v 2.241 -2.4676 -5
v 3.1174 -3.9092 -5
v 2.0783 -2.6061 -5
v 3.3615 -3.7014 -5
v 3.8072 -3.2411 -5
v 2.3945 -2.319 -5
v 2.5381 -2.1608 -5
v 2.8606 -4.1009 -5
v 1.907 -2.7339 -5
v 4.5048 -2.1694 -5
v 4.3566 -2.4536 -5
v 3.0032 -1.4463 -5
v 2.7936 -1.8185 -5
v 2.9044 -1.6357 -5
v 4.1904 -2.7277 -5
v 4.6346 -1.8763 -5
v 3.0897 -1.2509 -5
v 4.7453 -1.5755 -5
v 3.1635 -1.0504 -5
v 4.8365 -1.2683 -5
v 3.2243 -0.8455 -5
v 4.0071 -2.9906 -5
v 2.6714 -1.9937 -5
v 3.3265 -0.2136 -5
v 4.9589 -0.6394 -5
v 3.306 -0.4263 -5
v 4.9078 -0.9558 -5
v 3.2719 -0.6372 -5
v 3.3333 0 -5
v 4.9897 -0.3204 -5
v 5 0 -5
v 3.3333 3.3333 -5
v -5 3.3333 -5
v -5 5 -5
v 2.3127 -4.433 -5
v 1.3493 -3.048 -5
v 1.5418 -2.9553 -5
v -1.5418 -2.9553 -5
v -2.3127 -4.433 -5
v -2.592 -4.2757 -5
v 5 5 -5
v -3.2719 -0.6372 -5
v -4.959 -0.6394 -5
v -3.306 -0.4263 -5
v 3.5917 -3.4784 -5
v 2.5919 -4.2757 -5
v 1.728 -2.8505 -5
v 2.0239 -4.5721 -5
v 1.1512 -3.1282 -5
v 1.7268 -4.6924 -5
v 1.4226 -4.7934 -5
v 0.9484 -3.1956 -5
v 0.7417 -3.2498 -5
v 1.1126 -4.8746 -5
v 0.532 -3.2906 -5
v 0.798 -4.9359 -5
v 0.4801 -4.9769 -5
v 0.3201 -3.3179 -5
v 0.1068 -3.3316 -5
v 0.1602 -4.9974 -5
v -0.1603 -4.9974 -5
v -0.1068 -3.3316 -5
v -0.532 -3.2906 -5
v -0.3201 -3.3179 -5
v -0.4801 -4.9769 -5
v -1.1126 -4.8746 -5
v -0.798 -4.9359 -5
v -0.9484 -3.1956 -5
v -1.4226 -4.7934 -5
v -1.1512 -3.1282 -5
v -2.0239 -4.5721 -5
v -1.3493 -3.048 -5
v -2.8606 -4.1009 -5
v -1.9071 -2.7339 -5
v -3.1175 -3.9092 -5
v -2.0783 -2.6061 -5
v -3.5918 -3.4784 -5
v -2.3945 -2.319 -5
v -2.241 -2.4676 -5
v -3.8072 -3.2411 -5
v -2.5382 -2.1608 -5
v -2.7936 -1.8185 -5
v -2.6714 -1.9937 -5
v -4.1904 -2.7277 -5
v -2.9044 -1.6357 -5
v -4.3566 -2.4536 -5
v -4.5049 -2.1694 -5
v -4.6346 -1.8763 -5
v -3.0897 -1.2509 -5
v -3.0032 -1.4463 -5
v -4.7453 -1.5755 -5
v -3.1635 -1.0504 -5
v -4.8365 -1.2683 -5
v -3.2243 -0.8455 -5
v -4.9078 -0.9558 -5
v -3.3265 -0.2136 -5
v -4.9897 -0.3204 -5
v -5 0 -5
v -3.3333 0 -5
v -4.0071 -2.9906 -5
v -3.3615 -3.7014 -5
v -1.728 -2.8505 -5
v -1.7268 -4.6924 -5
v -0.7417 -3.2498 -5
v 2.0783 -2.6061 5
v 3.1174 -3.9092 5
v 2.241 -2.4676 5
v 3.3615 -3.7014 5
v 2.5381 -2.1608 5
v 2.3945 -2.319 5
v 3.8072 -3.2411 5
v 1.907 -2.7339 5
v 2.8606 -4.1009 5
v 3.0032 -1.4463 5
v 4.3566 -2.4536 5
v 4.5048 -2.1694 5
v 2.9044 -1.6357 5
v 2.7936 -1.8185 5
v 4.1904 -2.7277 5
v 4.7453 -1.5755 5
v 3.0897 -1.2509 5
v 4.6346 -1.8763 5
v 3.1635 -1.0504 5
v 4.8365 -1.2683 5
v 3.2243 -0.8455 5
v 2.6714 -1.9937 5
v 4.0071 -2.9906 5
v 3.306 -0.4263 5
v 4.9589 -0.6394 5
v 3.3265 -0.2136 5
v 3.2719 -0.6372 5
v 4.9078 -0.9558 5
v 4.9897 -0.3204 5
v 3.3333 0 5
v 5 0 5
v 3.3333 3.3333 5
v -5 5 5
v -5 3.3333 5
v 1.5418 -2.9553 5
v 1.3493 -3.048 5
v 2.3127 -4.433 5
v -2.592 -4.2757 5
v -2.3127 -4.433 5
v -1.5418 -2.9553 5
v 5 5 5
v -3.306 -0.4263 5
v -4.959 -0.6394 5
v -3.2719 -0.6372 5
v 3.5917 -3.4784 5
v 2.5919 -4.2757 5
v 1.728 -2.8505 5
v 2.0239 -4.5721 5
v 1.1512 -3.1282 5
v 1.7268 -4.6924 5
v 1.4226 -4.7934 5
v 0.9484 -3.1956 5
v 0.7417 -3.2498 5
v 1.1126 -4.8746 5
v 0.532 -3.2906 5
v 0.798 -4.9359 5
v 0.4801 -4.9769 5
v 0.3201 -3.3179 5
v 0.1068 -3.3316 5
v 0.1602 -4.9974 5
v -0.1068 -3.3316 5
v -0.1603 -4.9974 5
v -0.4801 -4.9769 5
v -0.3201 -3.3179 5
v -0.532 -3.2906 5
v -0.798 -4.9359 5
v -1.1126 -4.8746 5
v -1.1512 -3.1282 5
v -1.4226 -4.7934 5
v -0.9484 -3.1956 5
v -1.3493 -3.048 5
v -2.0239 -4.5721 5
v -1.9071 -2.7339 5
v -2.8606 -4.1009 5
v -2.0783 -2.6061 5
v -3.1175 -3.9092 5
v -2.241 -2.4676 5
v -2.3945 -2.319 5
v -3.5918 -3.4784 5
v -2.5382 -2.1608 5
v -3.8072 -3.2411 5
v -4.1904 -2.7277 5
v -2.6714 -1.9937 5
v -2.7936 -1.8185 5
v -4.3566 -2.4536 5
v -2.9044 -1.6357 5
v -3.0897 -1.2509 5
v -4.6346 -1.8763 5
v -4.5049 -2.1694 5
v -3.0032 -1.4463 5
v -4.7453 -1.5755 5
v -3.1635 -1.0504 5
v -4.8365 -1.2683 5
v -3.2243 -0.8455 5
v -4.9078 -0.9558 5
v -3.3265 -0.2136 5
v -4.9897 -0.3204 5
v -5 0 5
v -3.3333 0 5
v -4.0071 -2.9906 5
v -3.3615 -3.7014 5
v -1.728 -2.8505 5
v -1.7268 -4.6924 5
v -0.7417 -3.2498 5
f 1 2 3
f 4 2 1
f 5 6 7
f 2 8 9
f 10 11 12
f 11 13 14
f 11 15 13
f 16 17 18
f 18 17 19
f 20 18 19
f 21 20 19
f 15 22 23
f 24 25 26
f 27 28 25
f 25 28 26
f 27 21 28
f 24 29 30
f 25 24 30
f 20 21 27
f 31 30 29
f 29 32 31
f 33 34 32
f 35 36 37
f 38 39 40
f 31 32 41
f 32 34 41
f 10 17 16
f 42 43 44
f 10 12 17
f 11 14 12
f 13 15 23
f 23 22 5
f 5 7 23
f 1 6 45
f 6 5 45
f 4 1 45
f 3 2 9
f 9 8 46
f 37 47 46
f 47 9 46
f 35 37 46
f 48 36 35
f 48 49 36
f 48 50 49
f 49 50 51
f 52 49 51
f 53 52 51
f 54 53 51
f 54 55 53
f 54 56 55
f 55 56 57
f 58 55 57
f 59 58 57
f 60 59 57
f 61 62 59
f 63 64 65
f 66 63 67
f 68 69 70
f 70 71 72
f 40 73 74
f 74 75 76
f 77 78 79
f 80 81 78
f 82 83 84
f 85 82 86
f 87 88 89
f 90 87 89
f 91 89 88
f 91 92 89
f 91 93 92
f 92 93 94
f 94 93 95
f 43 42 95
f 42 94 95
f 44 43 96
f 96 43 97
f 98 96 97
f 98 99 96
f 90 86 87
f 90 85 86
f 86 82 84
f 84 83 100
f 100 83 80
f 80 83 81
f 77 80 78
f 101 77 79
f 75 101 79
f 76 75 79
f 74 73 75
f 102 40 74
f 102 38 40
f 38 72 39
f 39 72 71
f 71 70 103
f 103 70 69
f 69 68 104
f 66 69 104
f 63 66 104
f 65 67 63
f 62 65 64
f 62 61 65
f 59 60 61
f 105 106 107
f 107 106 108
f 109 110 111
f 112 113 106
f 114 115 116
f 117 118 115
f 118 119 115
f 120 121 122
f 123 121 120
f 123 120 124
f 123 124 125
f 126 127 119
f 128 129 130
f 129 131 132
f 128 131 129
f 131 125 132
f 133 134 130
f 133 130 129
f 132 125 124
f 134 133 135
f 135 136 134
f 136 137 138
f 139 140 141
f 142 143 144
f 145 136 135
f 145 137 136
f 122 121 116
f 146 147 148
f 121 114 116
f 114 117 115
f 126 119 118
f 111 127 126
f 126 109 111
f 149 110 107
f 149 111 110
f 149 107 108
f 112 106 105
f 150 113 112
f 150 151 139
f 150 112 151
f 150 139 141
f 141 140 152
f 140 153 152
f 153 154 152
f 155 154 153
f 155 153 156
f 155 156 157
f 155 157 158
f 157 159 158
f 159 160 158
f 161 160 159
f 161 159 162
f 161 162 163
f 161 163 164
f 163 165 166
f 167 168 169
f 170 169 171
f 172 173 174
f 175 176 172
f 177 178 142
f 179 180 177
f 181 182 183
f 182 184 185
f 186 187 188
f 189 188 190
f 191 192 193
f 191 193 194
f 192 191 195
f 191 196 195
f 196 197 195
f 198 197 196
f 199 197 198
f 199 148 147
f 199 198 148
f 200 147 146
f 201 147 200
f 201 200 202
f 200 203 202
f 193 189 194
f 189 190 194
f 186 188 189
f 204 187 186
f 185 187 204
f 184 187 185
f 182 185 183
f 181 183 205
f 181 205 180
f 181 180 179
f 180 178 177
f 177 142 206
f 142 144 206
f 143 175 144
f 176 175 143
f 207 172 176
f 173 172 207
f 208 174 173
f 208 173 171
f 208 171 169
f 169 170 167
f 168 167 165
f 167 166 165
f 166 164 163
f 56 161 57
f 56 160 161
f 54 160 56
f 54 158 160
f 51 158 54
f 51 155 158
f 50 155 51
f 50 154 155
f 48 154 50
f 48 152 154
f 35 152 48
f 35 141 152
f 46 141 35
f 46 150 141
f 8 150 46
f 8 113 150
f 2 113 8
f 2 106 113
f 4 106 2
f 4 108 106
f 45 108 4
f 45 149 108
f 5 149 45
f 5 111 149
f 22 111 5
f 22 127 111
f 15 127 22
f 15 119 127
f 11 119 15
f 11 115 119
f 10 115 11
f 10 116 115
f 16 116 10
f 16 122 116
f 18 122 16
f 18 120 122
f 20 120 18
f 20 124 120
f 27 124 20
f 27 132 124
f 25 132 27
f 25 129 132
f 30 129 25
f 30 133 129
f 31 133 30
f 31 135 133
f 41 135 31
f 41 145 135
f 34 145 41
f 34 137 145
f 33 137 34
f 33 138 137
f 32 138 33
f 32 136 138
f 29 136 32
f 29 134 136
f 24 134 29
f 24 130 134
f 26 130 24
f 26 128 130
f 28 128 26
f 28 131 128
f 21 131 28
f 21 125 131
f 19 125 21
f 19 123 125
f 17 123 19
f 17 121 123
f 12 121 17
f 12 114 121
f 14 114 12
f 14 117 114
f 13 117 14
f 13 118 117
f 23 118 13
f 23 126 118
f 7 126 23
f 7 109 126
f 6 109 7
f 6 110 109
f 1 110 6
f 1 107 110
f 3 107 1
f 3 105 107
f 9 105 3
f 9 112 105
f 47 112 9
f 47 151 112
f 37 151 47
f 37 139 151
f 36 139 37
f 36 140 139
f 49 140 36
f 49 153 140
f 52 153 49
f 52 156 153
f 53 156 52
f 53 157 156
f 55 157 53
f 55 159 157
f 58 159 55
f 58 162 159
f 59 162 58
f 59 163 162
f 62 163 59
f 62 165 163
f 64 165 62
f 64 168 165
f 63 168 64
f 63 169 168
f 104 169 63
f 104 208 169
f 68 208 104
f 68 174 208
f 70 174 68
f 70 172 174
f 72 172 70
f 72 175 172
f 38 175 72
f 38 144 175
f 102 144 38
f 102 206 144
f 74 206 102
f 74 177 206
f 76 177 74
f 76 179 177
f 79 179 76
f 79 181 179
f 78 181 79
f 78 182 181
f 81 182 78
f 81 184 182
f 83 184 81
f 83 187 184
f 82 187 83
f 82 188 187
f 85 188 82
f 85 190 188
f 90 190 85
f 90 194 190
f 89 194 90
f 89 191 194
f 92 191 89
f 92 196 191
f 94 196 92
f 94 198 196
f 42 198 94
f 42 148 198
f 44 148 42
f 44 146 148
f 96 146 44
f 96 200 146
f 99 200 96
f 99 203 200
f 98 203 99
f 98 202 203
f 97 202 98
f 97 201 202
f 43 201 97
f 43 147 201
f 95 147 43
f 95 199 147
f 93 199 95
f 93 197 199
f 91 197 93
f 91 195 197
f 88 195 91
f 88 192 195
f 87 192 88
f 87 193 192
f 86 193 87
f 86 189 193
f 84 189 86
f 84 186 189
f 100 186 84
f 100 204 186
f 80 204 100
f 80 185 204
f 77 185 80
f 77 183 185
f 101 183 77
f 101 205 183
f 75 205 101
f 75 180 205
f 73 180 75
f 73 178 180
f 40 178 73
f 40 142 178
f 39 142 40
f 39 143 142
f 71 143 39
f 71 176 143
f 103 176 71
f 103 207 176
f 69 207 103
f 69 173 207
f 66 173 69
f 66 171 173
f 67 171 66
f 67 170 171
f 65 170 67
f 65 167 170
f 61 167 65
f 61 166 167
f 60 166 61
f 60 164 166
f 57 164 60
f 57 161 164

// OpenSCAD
// Generated by SolidPython 1.1.3 on 2025-02-22 16:50:01
$fn=50;


translate(v = [-5.0000000000, -5.0000000000, -5.0000000000]) {
	linear_extrude(height = 10) {
		polygon(points = [[8.3333333333, 5.0000000000], [8.3264846425, 4.7864326001], [8.3059667127, 4.5737427944], [8.2718638566, 4.3628045710], [8.2243162101, 4.1544847203], [8.1635191567, 3.9496392733], [8.0897225245, 3.7491099837], [8.0032295597, 3.5537208696], [7.9043956804, 3.3642748267], [7.7936270163, 3.1815503293], [7.6713787396, 3.0062982317], [7.5381531946, 2.8392386823], [7.3944978337, 2.6810581647], [7.2410029675, 2.5324066764], [7.0782993395, 2.3938950584], [6.9070555337, 2.2660924847], [6.7279752277, 2.1495241233], [6.5417943008, 2.0446689788], [6.3492778104, 1.9519579233], [6.1512168481, 1.8717719265], [5.9484252888, 1.8044404899], [5.7417364465, 1.7502402927], [5.5319996501, 1.7093940553], [5.3200767530, 1.6820696235], [5.1068385919, 1.6683792793], [4.8931614081, 1.6683792793], [4.6799232470, 1.6820696235], [4.4680003499, 1.7093940553], [4.2582635535, 1.7502402927], [4.0515747112, 1.8044404899], [3.8487831519, 1.8717719265], [3.6507221896, 1.9519579233], [3.4582056992, 2.0446689788], [3.2720247723, 2.1495241233], [3.0929444663, 2.2660924847], [2.9217006605, 2.3938950584], [2.7589970325, 2.5324066764], [2.6055021663, 2.6810581647], [2.4618468054, 2.8392386823], [2.3286212604, 3.0062982317], [2.2063729837, 3.1815503293], [2.0956043196, 3.3642748267], [1.9967704403, 3.5537208696], [1.9102774755, 3.7491099837], [1.8364808433, 3.9496392733], [1.7756837899, 4.1544847203], [1.7281361434, 4.3628045710], [1.6940332873, 4.5737427944], [1.6735153575, 4.7864326001], [1.6666666667, 5.0000000000], [0.0000000000, 5.0000000000], [0.0102730362, 4.6796489001], [0.0410499309, 4.3606141916], [0.0922042150, 4.0442068565], [0.1635256848, 3.7317270805], [0.2547212649, 3.4244589099], [0.3654162133, 3.1236649756], [0.4951556605, 2.8305813044], [0.6434064794, 2.5464122400], [0.8095594755, 2.2723254939], [0.9929318907, 2.0094473475], [1.1927702082, 1.7588580235], [1.4082532495, 1.5215872470], [1.6384955487, 1.2986100146], [1.8825509907, 1.0908425877], [2.1394166994, 0.8991387270], [2.4080371584, 0.7242861850], [2.6873085488, 0.5670034681], [2.9760832844, 0.4279368849], [3.2731747279, 0.3076578898], [3.5773620668, 0.2066607348], [3.8873953302, 0.1253604391], [4.2020005248, 0.0640910829], [4.5198848705, 0.0231044353], [4.8397421121, 0.0025689190], [5.1602578879, 0.0025689190], [5.4801151295, 0.0231044353], [5.7979994752, 0.0640910829], [6.1126046698, 0.1253604391], [6.4226379332, 0.2066607348], [6.7268252721, 0.3076578898], [7.0239167156, 0.4279368849], [7.3126914512, 0.5670034681], [7.5919628416, 0.7242861850], [7.8605833006, 0.8991387270], [8.1174490093, 1.0908425877], [8.3615044513, 1.2986100146], [8.5917467505, 1.5215872470], [8.8072297918, 1.7588580235], [9.0070681093, 2.0094473475], [9.1904405245, 2.2723254939], [9.3565935206, 2.5464122400], [9.5048443395, 2.8305813044], [9.6345837867, 3.1236649756], [9.7452787351, 3.4244589099], [9.8364743152, 3.7317270805], [9.9077957850, 4.0442068565], [9.9589500691, 4.3606141916], [9.9897269638, 4.6796489001], [10.0000000000, 5.0000000000], [10, 10], [0, 10], [0, 8.3333333333], [8.3333333333, 8.3333333333]]);
	}
}
/***********************************************
*********      SolidPython code:      **********
************************************************
 
from solid import *
from solid.utils import *

import math
import matplotlib.pyplot as plt
import subprocess
import os
import pdb

def arc_points(radius, start_angle, end_angle, center=[0,0], num_points=50):
    angles = [start_angle + i * (end_angle - start_angle) / (num_points - 1)
              for i in range(num_points)]
    points = [
        (center[0] + radius * math.cos(math.radians(angle)),
         center[1] + radius * math.sin(math.radians(angle)))
        for angle in angles
    ]
    return points

class Hole:
    def __init__(self, radius, x, y):
        """
        Hole defined by:
        :param x: x dimension for center point of the circle as a ratio of letter height
        :param y: y dimension for center point of the circle as a ratio of letter height
        :param radius: radius of circle as a ratio of letter height
        """
        self.x = x
        self.y = y
        self.radius = radius

class Letter2D:
    def __init__(self, letter, scale):
        self.letter = letter
        self.scale = scale
        self.shape = self.generate()


    def get_letter_points(self):
        points = []
        if self.letter == "A":
            points = [(0,0), (1/2, 1), (1, 0), (5/6, 0), (2/3, 1/3), (1/3, 1/3), (1/6, 0)]
        if self.letter == "B":
            top_arc_points = arc_points(1/4, 90, -90, center=[3/4, 3/4])
            bottom_arc_points = arc_points(1/4, 90, -90, center=[3/4, 1/4])
            other_points = [(0,0),(0,1)]
            points = top_arc_points + bottom_arc_points + other_points
        if self.letter == "C":
            outer_arc_points = arc_points(1/2, 30, 330, center=[1/2,1/2])
            inner_arc_points = arc_points(1/4, 30, 330, center=[1/2,1/2])[::-1]
            points = outer_arc_points + inner_arc_points
        if self.letter == "D":
            outer_arc_points = arc_points(1/2, 90, -90, center= [1/2, 1/2])
            points = outer_arc_points + [(0,0), (0, 1)]
        if self.letter == "E":
            points = [(0,0), (1,0), (1,1/5), (1/5,1/5), (1/5,2/5), (3/4,2/5), (3/4,3/5), (1/5,3/5), (1/5,4/5), (1,4/5), (1,1), (0,1)]
        if self.letter == "F":
            points = [(0,0), (1/5,0), (1/5,2/5), (3/4,2/5), (3/4,3/5), (1/5,3/5), (1/5,4/5), (1,4/5), (1,1), (0,1)]
        if self.letter == "H":
            points = [(0, 0), (0, 1), (1/6, 1), (1/6, 7/12), (5/6, 7/12), (5/6, 1), (1, 1), (1, 0), (5/6, 0), (5/6, 5/12), (1/6, 5/12), (1/6, 0)]
        if self.letter == "I":
            points = [(0,0), (1,0), (1,1/6), (7/12,1/6), (7/12,5/6), (1,5/6), (1,1), (0,1), (0,5/6), (5/12,5/6), (5/12,1/6), (0,1/6)]
        if self.letter == "J":
            inner_arc = arc_points(1/3, 360, 180, [1/2,1/2])
            outer_arc = arc_points(1/2, 180, 360, [1/2,1/2])
            other_points = [(1,1), (0,1), (0,5/6), (5/6,5/6)]
            points = inner_arc + outer_arc + other_points

        scaled_points = [(p[0] * self.scale, p[1] * self.scale) for p in points]
        return scaled_points
    

    def get_letter_holes(self):
        holes = []
        if self.letter == "A": 
            holes = [Hole(1/6, 1/2, 7/12)]
        if self.letter == "B":
            holes = [Hole(1/6, 1/2, 3/4), Hole(1/6, 1/2, 1/4)]
        if self.letter == "D":
            holes = [Hole(1/2, 1/2, 1/6)]

        scaled_holes = [Hole(hole.radius*self.scale, hole.x*self.scale, hole.y*self.scale) for hole in holes]
        return scaled_holes

    
    def generate(self):
        outer_shape_points = self.get_letter_points()
        shape = polygon(points=outer_shape_points)
        holes = self.get_letter_holes()

        if holes:
            for hole in holes:
                circle_hole = circle(r=hole.radius)
                positioned_hole = translate([hole.x, hole.y])(circle_hole)
                shape = difference()(shape, positioned_hole)
        return shape
    

    def render(self):
        scad_render_to_file(self.shape, f"output/{self.name}.scad", file_header='$fn=50;')
        subprocess.run(["C:\\Program Files\\OpenSCAD\\openscad.exe", "-o", f"output\\{self.name}.stl", f"output\\{self.name}.scad"])


class TwoLetter3D:
    def __init__(self, height, letterA, letterB=None):
        self.height = height
        self.letterA = letterA
        self.letterB = letterB
    

    def generate_3d_letter(self, letter):
        letter = letter.upper()
        # TODO: add catch here for is letter is not a letter
        shape = Letter2D(letter, self.height).generate()
        shape_3d = linear_extrude(height=self.height)(shape)
        centered_shape_3d = translate([-self.height/2, -self.height/2, -self.height/2])(shape_3d)
        return centered_shape_3d


    def render(self):
        letterA3D = self.generate_3d_letter(self.letterA)

        if self.letterB:
            letterB3D = self.generate_3d_letter(self.letterB)
            letterB3D = rotate(a=90, v=[0,1,0])(letterB3D)

            combined = intersection()(letterA3D, letterB3D)
            file_name = self.letterA + self.letterB
            scad_render_to_file(combined, f"output/{file_name}.scad", file_header='$fn=50;')
            subprocess.run(["C:\\Program Files\\OpenSCAD\\openscad.exe", "-o", f"output\\{file_name}.stl", f"output\\{file_name}.scad"])
            return
        else:
            file_name = self.letterA
            scad_render_to_file(letterA3D, f"output/{file_name}.scad", file_header='$fn=50;')
            subprocess.run(["C:\\Program Files\\OpenSCAD\\openscad.exe", "-o", f"output\\{file_name}.stl", f"output\\{file_name}.scad"])
            return
                


if __name__ == "__main__":
    os.makedirs("output", exist_ok=True)

        # # Generate a letter
    shape = TwoLetter3D(10, "J")
    shape.render()
    
    letters = [chr(x) for x in range(ord('A'), ord('H') + 1)]

    # # Generate all combos
    # for letter in letters:
    #     for other_letter in letters:
    #         shape = TwoLetter3D(10, letter, other_letter)
    #         shape.render()

    # # Generate all letters
    # for letter in letters:
    #     shape = TwoLetter3D(10, letter, "z")
 
 
************************************************/
